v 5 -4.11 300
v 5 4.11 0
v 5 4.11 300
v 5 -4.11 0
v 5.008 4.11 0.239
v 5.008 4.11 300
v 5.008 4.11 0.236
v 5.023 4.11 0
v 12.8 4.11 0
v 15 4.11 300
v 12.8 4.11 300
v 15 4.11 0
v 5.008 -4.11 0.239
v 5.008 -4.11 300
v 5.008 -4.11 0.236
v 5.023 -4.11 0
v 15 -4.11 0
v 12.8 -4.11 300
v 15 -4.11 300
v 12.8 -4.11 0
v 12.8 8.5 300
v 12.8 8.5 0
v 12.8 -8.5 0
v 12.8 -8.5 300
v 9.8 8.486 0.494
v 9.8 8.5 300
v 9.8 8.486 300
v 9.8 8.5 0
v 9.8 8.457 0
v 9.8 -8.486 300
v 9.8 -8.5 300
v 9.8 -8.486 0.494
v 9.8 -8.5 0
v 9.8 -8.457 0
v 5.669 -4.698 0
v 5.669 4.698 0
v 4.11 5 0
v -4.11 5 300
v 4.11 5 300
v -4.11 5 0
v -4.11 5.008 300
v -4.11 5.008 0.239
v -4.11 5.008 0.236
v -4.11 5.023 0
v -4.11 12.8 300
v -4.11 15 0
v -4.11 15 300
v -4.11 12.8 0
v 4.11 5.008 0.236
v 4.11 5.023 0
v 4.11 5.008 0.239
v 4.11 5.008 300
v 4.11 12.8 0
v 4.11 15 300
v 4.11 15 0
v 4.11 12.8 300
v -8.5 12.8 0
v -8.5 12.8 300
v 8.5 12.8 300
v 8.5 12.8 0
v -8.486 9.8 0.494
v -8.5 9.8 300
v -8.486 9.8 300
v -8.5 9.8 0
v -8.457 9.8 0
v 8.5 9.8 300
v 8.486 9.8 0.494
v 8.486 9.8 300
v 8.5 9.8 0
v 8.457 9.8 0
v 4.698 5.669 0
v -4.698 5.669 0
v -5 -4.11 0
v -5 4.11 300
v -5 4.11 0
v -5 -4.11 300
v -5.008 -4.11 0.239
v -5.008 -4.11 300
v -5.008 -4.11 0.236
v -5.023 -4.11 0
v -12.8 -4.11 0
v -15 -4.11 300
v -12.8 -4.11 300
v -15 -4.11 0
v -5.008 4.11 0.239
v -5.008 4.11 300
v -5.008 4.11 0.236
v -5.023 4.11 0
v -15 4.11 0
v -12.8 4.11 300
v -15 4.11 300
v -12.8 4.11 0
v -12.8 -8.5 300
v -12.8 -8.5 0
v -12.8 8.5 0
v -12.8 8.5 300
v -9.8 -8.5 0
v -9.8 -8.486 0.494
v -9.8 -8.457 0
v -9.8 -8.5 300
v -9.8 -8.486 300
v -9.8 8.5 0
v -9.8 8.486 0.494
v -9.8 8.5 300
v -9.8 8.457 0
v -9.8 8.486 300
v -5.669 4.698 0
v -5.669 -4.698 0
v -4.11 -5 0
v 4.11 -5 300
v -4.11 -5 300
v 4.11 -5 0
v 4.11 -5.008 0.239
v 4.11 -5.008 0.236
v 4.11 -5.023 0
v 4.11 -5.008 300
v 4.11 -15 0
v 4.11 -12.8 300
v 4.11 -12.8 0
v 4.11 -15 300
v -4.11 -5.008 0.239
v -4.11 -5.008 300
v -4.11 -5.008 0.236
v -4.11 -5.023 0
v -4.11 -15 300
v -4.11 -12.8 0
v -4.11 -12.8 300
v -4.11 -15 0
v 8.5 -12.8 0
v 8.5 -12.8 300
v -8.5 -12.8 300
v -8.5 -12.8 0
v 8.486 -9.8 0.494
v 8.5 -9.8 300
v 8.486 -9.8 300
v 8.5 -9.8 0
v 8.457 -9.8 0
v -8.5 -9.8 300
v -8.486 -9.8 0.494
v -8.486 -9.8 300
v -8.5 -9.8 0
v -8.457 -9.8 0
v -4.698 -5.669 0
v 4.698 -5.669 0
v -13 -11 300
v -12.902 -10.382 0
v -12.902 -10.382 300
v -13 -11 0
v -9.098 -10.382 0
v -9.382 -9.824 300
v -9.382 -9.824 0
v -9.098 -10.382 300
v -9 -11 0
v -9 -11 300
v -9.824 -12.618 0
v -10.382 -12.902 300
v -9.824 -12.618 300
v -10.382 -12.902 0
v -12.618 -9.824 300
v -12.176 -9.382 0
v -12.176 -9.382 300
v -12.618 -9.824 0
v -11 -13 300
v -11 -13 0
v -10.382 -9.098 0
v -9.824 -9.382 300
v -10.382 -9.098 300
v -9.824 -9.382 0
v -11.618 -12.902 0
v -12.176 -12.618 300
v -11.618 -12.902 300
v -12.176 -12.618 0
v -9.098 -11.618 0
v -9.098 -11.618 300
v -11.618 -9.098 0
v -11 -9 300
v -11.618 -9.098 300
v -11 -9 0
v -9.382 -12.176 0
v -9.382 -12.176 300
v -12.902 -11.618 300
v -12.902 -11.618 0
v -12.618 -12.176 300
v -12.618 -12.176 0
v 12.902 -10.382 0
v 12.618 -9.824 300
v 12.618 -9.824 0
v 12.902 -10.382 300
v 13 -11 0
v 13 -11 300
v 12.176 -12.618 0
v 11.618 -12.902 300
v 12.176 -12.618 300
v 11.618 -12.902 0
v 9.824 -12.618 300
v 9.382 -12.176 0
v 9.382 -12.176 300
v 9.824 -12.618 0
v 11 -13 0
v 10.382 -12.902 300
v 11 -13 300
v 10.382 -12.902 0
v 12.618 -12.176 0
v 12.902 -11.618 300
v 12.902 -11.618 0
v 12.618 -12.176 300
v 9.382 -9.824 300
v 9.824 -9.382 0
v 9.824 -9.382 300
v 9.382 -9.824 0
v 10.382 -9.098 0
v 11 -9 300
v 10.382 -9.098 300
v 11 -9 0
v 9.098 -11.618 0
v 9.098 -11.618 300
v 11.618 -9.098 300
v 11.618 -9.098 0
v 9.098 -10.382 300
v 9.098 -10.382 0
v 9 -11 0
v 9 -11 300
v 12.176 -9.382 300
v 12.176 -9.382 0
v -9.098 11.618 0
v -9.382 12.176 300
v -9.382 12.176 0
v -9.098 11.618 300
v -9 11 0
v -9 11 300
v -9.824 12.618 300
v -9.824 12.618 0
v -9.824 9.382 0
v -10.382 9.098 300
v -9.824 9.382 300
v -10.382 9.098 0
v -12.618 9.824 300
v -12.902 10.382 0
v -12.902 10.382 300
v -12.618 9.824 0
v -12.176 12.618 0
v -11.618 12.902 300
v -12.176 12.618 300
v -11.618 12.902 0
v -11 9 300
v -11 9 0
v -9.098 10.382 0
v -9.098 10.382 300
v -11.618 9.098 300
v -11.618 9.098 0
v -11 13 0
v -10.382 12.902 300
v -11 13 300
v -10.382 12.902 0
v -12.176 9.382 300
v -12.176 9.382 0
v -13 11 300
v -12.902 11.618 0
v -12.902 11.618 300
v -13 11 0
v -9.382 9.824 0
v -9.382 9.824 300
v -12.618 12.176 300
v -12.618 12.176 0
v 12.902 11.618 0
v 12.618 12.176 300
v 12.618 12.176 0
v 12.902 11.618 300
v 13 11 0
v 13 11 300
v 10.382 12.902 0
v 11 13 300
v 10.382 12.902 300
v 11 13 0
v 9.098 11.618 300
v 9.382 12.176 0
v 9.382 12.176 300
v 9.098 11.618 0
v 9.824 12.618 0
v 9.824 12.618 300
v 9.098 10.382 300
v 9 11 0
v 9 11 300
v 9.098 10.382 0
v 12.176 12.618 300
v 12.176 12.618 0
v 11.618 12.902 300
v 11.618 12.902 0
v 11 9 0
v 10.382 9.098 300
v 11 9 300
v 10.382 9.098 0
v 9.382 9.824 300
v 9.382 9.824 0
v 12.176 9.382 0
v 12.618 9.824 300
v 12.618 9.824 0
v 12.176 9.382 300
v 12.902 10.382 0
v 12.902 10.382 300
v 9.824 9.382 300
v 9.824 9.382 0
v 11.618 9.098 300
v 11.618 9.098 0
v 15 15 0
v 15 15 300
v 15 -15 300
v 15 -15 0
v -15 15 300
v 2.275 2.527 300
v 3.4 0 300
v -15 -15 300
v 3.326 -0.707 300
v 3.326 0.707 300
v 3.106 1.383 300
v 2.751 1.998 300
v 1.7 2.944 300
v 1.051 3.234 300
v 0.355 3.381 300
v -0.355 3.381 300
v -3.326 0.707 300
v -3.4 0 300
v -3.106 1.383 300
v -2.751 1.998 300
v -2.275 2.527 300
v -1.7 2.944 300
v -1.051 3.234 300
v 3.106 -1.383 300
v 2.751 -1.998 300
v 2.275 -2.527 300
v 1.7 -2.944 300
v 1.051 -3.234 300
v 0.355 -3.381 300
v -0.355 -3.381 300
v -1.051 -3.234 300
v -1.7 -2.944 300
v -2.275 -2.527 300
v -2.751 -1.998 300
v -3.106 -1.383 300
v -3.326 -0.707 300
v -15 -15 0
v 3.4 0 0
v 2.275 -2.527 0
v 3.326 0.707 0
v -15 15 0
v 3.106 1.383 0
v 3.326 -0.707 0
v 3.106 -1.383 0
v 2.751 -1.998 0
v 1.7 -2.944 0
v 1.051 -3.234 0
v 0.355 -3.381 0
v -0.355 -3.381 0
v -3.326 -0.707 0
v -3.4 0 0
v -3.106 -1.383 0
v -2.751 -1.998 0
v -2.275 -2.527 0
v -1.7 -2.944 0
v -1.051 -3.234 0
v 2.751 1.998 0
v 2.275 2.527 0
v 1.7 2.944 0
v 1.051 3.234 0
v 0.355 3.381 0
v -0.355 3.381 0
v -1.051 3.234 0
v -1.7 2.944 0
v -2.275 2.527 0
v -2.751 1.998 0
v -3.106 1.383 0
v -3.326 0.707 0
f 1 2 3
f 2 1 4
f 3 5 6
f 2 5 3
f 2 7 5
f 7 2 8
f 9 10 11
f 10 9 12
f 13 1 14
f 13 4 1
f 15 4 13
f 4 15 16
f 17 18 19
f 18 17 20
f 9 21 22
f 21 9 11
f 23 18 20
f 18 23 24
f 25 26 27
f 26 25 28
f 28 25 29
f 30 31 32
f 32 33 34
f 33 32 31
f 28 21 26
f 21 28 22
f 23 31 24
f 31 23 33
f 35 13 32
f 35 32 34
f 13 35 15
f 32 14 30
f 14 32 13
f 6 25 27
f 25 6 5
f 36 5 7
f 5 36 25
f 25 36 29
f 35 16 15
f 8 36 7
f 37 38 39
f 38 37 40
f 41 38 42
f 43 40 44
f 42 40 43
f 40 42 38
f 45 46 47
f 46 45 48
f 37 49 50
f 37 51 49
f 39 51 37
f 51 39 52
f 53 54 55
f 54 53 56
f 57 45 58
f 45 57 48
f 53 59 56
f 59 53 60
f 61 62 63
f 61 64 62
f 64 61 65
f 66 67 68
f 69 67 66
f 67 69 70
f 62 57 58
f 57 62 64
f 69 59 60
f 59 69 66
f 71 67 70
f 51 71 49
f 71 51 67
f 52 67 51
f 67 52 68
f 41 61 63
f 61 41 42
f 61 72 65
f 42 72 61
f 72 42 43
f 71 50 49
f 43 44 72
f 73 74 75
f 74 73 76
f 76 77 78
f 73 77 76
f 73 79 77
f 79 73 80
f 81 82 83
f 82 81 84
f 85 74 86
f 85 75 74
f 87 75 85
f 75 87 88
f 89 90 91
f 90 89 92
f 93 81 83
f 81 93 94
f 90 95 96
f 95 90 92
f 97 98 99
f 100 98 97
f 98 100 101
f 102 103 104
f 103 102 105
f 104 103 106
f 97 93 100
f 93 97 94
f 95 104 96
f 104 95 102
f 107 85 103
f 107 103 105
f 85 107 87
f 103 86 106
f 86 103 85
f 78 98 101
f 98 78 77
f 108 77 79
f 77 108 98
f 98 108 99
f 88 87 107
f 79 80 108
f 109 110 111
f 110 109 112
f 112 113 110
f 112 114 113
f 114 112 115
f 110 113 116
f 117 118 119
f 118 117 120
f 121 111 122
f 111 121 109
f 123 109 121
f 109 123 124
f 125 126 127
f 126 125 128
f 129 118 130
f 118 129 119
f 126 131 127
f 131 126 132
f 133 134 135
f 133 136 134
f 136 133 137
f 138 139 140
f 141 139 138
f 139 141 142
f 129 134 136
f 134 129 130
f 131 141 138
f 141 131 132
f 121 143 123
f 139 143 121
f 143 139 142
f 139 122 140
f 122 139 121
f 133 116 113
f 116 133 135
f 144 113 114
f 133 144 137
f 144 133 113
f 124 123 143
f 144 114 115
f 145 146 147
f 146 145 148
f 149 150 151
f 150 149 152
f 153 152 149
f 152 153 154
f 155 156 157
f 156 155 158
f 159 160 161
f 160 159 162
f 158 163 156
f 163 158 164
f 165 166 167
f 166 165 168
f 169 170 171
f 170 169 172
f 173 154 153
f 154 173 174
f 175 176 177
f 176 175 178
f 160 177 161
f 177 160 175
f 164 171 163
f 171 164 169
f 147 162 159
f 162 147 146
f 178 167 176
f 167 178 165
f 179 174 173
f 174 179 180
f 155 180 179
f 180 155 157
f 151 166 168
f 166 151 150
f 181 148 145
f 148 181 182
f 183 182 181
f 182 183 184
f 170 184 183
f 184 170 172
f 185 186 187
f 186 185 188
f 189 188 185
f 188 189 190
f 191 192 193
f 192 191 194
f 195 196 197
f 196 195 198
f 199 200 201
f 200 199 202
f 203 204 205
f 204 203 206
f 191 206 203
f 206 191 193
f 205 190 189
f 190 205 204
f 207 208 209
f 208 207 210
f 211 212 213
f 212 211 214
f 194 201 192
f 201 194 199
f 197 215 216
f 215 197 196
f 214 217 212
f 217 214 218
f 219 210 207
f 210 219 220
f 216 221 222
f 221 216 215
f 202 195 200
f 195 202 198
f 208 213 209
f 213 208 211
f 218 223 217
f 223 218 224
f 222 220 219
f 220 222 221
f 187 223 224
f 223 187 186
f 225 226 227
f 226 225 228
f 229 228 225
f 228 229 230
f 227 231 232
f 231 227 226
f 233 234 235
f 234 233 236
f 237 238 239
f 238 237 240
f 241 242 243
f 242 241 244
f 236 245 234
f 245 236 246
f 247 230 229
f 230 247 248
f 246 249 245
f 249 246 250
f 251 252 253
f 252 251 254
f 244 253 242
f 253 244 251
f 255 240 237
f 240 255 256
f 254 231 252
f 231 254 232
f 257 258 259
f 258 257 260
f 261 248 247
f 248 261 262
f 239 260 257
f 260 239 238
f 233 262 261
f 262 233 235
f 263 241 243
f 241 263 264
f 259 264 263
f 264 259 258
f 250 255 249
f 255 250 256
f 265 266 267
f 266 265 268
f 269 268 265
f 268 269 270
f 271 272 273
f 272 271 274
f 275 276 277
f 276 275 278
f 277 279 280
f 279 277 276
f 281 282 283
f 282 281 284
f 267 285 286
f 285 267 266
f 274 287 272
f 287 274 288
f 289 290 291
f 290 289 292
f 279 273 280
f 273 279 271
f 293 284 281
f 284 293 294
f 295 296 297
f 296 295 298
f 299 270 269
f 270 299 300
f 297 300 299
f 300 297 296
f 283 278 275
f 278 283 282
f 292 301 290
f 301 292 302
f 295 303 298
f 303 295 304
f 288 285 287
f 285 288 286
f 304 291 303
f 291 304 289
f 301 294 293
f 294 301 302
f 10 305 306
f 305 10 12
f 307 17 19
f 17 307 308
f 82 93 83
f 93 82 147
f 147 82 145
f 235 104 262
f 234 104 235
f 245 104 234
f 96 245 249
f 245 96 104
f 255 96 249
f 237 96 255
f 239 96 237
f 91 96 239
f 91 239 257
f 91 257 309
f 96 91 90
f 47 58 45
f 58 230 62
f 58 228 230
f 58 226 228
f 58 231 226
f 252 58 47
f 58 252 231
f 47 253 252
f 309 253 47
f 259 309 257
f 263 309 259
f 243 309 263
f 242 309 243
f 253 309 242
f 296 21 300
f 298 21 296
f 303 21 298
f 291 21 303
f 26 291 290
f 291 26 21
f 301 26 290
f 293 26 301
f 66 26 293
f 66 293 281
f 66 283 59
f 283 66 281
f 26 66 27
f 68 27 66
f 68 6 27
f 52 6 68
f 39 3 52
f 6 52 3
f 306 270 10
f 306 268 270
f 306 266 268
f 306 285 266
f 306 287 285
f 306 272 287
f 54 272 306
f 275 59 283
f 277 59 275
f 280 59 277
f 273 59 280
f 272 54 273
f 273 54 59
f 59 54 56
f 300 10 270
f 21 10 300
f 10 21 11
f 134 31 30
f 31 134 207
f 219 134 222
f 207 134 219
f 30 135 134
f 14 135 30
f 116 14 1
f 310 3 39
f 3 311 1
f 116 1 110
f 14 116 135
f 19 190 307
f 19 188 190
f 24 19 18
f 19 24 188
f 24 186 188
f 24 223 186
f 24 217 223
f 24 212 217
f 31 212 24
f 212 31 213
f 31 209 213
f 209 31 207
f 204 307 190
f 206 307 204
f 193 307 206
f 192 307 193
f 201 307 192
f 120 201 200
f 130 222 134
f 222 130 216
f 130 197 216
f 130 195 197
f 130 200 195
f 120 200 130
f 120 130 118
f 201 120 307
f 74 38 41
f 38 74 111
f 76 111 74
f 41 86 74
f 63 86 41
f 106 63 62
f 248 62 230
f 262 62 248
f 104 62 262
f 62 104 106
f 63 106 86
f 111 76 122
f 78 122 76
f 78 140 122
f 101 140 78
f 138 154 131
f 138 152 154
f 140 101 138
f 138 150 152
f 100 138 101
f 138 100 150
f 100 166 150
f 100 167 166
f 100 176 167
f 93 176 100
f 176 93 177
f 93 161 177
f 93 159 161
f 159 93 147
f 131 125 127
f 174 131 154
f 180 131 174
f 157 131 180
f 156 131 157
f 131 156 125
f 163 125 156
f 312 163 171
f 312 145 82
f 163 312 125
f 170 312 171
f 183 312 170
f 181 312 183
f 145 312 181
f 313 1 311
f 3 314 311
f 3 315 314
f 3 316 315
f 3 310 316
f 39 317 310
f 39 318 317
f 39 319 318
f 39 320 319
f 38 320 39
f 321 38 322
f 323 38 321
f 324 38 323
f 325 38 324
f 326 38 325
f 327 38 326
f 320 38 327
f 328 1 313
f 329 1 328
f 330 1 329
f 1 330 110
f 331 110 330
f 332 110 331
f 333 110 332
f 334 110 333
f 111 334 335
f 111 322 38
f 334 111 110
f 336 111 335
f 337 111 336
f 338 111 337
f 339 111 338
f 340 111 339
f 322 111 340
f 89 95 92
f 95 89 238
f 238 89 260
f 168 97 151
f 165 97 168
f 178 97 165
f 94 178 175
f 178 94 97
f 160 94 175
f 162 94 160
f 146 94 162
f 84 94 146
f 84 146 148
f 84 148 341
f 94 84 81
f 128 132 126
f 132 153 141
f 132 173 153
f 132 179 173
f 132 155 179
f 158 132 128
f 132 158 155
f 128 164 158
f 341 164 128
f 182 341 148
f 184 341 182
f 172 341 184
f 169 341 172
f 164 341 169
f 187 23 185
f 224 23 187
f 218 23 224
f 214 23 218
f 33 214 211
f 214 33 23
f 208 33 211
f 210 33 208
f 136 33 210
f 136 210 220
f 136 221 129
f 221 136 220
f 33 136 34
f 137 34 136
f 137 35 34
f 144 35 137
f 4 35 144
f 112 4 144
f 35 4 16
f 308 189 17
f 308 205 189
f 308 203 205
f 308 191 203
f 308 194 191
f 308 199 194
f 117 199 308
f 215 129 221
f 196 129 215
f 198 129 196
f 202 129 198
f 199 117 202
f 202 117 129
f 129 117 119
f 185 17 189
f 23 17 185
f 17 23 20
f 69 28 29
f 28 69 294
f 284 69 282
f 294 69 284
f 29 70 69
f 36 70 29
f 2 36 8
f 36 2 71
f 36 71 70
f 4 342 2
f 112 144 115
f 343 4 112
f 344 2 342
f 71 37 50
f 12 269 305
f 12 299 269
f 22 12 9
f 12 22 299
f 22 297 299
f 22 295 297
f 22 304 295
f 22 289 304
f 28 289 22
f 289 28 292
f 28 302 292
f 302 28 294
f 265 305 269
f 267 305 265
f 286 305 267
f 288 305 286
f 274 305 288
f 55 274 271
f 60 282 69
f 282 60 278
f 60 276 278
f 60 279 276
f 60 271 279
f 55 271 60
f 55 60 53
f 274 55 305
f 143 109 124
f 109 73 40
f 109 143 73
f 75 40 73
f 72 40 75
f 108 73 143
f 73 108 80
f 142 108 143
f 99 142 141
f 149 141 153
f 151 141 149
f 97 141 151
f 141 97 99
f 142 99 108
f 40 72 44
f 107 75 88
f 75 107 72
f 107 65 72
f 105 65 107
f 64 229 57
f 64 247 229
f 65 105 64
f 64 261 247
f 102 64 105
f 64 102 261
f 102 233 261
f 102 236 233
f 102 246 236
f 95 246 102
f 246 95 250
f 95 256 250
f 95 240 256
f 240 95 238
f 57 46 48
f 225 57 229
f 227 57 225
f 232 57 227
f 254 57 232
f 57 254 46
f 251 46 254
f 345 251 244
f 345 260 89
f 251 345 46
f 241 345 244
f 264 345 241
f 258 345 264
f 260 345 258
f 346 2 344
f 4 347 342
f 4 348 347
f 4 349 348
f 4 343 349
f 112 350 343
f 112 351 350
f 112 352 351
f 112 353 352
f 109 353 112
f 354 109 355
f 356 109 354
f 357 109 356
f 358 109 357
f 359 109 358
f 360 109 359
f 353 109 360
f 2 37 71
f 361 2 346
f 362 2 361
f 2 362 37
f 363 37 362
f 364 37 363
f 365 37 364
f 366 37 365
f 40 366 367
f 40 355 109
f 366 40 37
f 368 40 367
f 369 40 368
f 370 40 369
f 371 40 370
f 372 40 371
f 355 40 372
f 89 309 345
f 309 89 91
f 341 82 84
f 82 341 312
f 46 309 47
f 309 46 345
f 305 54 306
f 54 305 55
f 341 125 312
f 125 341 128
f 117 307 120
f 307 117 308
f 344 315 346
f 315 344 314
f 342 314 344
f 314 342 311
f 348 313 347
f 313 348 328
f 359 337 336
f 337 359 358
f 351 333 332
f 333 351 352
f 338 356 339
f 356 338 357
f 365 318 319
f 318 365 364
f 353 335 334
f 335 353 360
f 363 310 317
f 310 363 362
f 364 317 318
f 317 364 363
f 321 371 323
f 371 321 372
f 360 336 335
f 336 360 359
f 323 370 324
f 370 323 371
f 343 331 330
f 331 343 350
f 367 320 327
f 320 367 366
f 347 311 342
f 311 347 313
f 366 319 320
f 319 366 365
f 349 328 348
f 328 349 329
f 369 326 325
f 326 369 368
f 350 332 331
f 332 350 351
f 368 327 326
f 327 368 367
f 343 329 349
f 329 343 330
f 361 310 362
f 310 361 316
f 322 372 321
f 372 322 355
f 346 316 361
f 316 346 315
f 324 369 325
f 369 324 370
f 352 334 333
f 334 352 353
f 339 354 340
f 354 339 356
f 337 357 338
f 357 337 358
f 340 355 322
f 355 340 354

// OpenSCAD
// file: tolerance.scad
// Author: Mihai Oltean, https://mihaioltean.github.io, mihai.oltean@gmail.com
// More details: jenny5.org
// Source: github.com/jenny5-robot
// MIT License
//--------------------------------------------------------------

tolerance = 0.1;
display_tolerance = 1;

overlap_tolerance = 0.01;

tolerance_z = [0, 0, tolerance];
tolerance_x = [tolerance, 0, 0];
tolerance_y = [0, tolerance, 0];

display_tolerance_z = [0, 0, display_tolerance];
display_tolerance_x = [display_tolerance, 0, 0];
display_tolerance_y = [0, display_tolerance, 0];

display_tolerance_xz = [display_tolerance, 0, display_tolerance];
display_tolerance_xy = [display_tolerance, display_tolerance, 0];
display_tolerance_yz = [0, display_tolerance, display_tolerance];

display_tolerance_xyz = [display_tolerance, display_tolerance, display_tolerance];
// file: params_alu_profiles.scad
// Author: Mihai Oltean, www.tcreate.org, mihai.oltean@gmail.com
// More details: jenny5.org
// Source: github.com/jenny5-robot
// MIT License
//--------------------------------------------------------------

profile_height_20x20 = 20;
profile_height_30x30 = 30;
profile_30x30_size = [30, 30];

dist_edge_profile_to_small_hole = 4;

L_profile_40x20_long_size = 40;
L_profile_40x20_short_size = 20;

rectangular_tube_30x30x3_size = [30, 30];
rectangular_tube_30x30x3_wall_thick = 2;

groove_diameter = 8.22;
groove_height = 10;
groove_wall_thick = 2.2;

sigma_profile_holes = [
[0, 0, 0],
[-11.5, -11.5, 0],
[11.5, -11.5, 0],
[-11.5, 11.5, 0],
[11.5, 11.5, 0]
];
//--------------------------------------------------------------
// file: config.scad
// Author: Mihai Oltean, www.tcreate.org, mihai.oltean@gmail.com
// More details: jenny5.org
// Source: github.com/jenny5-robot
// MIT License
//--------------------------------------------------------------

aluminium_color = "Silver";
screw_color = "LightSlateGray";
frame_color = aluminium_color;
shaft_color = "Silver";
plastic_color = "LimeGreen";
pulley_color = "DarkSlateGray";
steel_color = "LightSlateGray";
// file: params_basic_components.scad
// Author: Mihai Oltean, https://mihaioltean.github.io, mihai.oltean@gmail.com
// More details: jenny5.org
// Source: github.com/jenny5-robot
// MIT License
//--------------------------------------------------------------

spring_length = 20;

smooth_rod_8_radius = 4;
smooth_rod_10_radius = 5;
smooth_rod_12_radius = 6;

wall_thick_1 = 1;
wall_thick_2 = 2;
wall_thick_3 = 3;
wall_thick_4 = 4;
wall_thick_5 = 5;
wall_thick_5_5 = 5.5;
wall_thick_6 = 6;
wall_thick_7 = 7;
wall_thick_8 = 8;
wall_thick_9 = 9;
wall_thick_10 = 10;
wall_thick_12 = 12;
// main file
// Author: Mihai Oltean, www.tcreate.org, mihai.oltean@gmail.com
// More details: jenny5.org
// Source: github.com/jenny5-robot
// MIT License
//--------------------------------------------------------------

include <params_basic_components.scad>
include <config.scad>
include <params_alu_profiles.scad>
include <tolerance.scad>

//-----------------------------------------------------------------------
module alu_sigma_profile_30x30(length)
{//
	perete = wall_thick_2;
	adancime = 9;
	diametru_mare = 16.5;
    
	
    color(frame_color)
    render()
    difference(){
        
            translate ([-profile_30x30_size[0] / 2, -profile_30x30_size[1] / 2, 0]) cube([profile_30x30_size[0], profile_30x30_size[1], length]);
// center hole
		translate (sigma_profile_holes[0] - display_tolerance_z) cylinder (h = length + 2 * display_tolerance, r = 3.4, $fn = 30);

// groves
        for (i = [0 : 3])
            rotate([0, 0, 90 * i]){
                translate ([profile_30x30_size[0] / 2 - groove_height, -groove_diameter / 2, 0] - tolerance_z) cube([groove_height, groove_diameter, length] + 2 * display_tolerance_xz);
                translate ([profile_30x30_size[0] / 2 - groove_wall_thick - 3, -8.5, 0] - tolerance_z) cube([3, 17, length] + 2 * display_tolerance_z);

                hull(){
                    translate ([5, 0, 0]) rotate ([0, 90, 0]) cylinder (h = groove_height - groove_wall_thick - 3, r1 = groove_diameter / 2, r2 = 8.5);
                    translate ([5, 0, length]) rotate ([0, 90, 0]) cylinder (h = groove_height - groove_wall_thick - 3, r1 = groove_diameter / 2, r2 = 8.5);
                }        
            }        
            
        // small holes
        for (i = [1 : 4])
            translate (sigma_profile_holes[i] - display_tolerance_z) cylinder (h = length + 2 * display_tolerance, r = 2, $fn = 20);
	}
}
//-----------------------------------------------------------------------
module U(length, base, height, wall_thick)
{
    //render(){
        difference(){
            cube ([length, base, height]);
            translate ([-display_tolerance, wall_thick, wall_thick]) cube ([length + 2 * display_tolerance, base - 2 * wall_thick, height - wall_thick + display_tolerance]);
        }
    //}
}
//--------------------------------------------------------------
module L_profile(length, edge_1_width = 20, edge_2_width = 20, wall_thick = 3)
{
  difference(){
    color (aluminium_color) cube ([edge_2_width, length, edge_1_width]);
    translate ([wall_thick, 0, wall_thick] - display_tolerance_y) cube ([edge_2_width - wall_thick, length, edge_1_width - wall_thick] + display_tolerance_xyz + display_tolerance_y);
  }
}
//--------------------------------------------------------------

alu_sigma_profile_30x30(length = 300);
